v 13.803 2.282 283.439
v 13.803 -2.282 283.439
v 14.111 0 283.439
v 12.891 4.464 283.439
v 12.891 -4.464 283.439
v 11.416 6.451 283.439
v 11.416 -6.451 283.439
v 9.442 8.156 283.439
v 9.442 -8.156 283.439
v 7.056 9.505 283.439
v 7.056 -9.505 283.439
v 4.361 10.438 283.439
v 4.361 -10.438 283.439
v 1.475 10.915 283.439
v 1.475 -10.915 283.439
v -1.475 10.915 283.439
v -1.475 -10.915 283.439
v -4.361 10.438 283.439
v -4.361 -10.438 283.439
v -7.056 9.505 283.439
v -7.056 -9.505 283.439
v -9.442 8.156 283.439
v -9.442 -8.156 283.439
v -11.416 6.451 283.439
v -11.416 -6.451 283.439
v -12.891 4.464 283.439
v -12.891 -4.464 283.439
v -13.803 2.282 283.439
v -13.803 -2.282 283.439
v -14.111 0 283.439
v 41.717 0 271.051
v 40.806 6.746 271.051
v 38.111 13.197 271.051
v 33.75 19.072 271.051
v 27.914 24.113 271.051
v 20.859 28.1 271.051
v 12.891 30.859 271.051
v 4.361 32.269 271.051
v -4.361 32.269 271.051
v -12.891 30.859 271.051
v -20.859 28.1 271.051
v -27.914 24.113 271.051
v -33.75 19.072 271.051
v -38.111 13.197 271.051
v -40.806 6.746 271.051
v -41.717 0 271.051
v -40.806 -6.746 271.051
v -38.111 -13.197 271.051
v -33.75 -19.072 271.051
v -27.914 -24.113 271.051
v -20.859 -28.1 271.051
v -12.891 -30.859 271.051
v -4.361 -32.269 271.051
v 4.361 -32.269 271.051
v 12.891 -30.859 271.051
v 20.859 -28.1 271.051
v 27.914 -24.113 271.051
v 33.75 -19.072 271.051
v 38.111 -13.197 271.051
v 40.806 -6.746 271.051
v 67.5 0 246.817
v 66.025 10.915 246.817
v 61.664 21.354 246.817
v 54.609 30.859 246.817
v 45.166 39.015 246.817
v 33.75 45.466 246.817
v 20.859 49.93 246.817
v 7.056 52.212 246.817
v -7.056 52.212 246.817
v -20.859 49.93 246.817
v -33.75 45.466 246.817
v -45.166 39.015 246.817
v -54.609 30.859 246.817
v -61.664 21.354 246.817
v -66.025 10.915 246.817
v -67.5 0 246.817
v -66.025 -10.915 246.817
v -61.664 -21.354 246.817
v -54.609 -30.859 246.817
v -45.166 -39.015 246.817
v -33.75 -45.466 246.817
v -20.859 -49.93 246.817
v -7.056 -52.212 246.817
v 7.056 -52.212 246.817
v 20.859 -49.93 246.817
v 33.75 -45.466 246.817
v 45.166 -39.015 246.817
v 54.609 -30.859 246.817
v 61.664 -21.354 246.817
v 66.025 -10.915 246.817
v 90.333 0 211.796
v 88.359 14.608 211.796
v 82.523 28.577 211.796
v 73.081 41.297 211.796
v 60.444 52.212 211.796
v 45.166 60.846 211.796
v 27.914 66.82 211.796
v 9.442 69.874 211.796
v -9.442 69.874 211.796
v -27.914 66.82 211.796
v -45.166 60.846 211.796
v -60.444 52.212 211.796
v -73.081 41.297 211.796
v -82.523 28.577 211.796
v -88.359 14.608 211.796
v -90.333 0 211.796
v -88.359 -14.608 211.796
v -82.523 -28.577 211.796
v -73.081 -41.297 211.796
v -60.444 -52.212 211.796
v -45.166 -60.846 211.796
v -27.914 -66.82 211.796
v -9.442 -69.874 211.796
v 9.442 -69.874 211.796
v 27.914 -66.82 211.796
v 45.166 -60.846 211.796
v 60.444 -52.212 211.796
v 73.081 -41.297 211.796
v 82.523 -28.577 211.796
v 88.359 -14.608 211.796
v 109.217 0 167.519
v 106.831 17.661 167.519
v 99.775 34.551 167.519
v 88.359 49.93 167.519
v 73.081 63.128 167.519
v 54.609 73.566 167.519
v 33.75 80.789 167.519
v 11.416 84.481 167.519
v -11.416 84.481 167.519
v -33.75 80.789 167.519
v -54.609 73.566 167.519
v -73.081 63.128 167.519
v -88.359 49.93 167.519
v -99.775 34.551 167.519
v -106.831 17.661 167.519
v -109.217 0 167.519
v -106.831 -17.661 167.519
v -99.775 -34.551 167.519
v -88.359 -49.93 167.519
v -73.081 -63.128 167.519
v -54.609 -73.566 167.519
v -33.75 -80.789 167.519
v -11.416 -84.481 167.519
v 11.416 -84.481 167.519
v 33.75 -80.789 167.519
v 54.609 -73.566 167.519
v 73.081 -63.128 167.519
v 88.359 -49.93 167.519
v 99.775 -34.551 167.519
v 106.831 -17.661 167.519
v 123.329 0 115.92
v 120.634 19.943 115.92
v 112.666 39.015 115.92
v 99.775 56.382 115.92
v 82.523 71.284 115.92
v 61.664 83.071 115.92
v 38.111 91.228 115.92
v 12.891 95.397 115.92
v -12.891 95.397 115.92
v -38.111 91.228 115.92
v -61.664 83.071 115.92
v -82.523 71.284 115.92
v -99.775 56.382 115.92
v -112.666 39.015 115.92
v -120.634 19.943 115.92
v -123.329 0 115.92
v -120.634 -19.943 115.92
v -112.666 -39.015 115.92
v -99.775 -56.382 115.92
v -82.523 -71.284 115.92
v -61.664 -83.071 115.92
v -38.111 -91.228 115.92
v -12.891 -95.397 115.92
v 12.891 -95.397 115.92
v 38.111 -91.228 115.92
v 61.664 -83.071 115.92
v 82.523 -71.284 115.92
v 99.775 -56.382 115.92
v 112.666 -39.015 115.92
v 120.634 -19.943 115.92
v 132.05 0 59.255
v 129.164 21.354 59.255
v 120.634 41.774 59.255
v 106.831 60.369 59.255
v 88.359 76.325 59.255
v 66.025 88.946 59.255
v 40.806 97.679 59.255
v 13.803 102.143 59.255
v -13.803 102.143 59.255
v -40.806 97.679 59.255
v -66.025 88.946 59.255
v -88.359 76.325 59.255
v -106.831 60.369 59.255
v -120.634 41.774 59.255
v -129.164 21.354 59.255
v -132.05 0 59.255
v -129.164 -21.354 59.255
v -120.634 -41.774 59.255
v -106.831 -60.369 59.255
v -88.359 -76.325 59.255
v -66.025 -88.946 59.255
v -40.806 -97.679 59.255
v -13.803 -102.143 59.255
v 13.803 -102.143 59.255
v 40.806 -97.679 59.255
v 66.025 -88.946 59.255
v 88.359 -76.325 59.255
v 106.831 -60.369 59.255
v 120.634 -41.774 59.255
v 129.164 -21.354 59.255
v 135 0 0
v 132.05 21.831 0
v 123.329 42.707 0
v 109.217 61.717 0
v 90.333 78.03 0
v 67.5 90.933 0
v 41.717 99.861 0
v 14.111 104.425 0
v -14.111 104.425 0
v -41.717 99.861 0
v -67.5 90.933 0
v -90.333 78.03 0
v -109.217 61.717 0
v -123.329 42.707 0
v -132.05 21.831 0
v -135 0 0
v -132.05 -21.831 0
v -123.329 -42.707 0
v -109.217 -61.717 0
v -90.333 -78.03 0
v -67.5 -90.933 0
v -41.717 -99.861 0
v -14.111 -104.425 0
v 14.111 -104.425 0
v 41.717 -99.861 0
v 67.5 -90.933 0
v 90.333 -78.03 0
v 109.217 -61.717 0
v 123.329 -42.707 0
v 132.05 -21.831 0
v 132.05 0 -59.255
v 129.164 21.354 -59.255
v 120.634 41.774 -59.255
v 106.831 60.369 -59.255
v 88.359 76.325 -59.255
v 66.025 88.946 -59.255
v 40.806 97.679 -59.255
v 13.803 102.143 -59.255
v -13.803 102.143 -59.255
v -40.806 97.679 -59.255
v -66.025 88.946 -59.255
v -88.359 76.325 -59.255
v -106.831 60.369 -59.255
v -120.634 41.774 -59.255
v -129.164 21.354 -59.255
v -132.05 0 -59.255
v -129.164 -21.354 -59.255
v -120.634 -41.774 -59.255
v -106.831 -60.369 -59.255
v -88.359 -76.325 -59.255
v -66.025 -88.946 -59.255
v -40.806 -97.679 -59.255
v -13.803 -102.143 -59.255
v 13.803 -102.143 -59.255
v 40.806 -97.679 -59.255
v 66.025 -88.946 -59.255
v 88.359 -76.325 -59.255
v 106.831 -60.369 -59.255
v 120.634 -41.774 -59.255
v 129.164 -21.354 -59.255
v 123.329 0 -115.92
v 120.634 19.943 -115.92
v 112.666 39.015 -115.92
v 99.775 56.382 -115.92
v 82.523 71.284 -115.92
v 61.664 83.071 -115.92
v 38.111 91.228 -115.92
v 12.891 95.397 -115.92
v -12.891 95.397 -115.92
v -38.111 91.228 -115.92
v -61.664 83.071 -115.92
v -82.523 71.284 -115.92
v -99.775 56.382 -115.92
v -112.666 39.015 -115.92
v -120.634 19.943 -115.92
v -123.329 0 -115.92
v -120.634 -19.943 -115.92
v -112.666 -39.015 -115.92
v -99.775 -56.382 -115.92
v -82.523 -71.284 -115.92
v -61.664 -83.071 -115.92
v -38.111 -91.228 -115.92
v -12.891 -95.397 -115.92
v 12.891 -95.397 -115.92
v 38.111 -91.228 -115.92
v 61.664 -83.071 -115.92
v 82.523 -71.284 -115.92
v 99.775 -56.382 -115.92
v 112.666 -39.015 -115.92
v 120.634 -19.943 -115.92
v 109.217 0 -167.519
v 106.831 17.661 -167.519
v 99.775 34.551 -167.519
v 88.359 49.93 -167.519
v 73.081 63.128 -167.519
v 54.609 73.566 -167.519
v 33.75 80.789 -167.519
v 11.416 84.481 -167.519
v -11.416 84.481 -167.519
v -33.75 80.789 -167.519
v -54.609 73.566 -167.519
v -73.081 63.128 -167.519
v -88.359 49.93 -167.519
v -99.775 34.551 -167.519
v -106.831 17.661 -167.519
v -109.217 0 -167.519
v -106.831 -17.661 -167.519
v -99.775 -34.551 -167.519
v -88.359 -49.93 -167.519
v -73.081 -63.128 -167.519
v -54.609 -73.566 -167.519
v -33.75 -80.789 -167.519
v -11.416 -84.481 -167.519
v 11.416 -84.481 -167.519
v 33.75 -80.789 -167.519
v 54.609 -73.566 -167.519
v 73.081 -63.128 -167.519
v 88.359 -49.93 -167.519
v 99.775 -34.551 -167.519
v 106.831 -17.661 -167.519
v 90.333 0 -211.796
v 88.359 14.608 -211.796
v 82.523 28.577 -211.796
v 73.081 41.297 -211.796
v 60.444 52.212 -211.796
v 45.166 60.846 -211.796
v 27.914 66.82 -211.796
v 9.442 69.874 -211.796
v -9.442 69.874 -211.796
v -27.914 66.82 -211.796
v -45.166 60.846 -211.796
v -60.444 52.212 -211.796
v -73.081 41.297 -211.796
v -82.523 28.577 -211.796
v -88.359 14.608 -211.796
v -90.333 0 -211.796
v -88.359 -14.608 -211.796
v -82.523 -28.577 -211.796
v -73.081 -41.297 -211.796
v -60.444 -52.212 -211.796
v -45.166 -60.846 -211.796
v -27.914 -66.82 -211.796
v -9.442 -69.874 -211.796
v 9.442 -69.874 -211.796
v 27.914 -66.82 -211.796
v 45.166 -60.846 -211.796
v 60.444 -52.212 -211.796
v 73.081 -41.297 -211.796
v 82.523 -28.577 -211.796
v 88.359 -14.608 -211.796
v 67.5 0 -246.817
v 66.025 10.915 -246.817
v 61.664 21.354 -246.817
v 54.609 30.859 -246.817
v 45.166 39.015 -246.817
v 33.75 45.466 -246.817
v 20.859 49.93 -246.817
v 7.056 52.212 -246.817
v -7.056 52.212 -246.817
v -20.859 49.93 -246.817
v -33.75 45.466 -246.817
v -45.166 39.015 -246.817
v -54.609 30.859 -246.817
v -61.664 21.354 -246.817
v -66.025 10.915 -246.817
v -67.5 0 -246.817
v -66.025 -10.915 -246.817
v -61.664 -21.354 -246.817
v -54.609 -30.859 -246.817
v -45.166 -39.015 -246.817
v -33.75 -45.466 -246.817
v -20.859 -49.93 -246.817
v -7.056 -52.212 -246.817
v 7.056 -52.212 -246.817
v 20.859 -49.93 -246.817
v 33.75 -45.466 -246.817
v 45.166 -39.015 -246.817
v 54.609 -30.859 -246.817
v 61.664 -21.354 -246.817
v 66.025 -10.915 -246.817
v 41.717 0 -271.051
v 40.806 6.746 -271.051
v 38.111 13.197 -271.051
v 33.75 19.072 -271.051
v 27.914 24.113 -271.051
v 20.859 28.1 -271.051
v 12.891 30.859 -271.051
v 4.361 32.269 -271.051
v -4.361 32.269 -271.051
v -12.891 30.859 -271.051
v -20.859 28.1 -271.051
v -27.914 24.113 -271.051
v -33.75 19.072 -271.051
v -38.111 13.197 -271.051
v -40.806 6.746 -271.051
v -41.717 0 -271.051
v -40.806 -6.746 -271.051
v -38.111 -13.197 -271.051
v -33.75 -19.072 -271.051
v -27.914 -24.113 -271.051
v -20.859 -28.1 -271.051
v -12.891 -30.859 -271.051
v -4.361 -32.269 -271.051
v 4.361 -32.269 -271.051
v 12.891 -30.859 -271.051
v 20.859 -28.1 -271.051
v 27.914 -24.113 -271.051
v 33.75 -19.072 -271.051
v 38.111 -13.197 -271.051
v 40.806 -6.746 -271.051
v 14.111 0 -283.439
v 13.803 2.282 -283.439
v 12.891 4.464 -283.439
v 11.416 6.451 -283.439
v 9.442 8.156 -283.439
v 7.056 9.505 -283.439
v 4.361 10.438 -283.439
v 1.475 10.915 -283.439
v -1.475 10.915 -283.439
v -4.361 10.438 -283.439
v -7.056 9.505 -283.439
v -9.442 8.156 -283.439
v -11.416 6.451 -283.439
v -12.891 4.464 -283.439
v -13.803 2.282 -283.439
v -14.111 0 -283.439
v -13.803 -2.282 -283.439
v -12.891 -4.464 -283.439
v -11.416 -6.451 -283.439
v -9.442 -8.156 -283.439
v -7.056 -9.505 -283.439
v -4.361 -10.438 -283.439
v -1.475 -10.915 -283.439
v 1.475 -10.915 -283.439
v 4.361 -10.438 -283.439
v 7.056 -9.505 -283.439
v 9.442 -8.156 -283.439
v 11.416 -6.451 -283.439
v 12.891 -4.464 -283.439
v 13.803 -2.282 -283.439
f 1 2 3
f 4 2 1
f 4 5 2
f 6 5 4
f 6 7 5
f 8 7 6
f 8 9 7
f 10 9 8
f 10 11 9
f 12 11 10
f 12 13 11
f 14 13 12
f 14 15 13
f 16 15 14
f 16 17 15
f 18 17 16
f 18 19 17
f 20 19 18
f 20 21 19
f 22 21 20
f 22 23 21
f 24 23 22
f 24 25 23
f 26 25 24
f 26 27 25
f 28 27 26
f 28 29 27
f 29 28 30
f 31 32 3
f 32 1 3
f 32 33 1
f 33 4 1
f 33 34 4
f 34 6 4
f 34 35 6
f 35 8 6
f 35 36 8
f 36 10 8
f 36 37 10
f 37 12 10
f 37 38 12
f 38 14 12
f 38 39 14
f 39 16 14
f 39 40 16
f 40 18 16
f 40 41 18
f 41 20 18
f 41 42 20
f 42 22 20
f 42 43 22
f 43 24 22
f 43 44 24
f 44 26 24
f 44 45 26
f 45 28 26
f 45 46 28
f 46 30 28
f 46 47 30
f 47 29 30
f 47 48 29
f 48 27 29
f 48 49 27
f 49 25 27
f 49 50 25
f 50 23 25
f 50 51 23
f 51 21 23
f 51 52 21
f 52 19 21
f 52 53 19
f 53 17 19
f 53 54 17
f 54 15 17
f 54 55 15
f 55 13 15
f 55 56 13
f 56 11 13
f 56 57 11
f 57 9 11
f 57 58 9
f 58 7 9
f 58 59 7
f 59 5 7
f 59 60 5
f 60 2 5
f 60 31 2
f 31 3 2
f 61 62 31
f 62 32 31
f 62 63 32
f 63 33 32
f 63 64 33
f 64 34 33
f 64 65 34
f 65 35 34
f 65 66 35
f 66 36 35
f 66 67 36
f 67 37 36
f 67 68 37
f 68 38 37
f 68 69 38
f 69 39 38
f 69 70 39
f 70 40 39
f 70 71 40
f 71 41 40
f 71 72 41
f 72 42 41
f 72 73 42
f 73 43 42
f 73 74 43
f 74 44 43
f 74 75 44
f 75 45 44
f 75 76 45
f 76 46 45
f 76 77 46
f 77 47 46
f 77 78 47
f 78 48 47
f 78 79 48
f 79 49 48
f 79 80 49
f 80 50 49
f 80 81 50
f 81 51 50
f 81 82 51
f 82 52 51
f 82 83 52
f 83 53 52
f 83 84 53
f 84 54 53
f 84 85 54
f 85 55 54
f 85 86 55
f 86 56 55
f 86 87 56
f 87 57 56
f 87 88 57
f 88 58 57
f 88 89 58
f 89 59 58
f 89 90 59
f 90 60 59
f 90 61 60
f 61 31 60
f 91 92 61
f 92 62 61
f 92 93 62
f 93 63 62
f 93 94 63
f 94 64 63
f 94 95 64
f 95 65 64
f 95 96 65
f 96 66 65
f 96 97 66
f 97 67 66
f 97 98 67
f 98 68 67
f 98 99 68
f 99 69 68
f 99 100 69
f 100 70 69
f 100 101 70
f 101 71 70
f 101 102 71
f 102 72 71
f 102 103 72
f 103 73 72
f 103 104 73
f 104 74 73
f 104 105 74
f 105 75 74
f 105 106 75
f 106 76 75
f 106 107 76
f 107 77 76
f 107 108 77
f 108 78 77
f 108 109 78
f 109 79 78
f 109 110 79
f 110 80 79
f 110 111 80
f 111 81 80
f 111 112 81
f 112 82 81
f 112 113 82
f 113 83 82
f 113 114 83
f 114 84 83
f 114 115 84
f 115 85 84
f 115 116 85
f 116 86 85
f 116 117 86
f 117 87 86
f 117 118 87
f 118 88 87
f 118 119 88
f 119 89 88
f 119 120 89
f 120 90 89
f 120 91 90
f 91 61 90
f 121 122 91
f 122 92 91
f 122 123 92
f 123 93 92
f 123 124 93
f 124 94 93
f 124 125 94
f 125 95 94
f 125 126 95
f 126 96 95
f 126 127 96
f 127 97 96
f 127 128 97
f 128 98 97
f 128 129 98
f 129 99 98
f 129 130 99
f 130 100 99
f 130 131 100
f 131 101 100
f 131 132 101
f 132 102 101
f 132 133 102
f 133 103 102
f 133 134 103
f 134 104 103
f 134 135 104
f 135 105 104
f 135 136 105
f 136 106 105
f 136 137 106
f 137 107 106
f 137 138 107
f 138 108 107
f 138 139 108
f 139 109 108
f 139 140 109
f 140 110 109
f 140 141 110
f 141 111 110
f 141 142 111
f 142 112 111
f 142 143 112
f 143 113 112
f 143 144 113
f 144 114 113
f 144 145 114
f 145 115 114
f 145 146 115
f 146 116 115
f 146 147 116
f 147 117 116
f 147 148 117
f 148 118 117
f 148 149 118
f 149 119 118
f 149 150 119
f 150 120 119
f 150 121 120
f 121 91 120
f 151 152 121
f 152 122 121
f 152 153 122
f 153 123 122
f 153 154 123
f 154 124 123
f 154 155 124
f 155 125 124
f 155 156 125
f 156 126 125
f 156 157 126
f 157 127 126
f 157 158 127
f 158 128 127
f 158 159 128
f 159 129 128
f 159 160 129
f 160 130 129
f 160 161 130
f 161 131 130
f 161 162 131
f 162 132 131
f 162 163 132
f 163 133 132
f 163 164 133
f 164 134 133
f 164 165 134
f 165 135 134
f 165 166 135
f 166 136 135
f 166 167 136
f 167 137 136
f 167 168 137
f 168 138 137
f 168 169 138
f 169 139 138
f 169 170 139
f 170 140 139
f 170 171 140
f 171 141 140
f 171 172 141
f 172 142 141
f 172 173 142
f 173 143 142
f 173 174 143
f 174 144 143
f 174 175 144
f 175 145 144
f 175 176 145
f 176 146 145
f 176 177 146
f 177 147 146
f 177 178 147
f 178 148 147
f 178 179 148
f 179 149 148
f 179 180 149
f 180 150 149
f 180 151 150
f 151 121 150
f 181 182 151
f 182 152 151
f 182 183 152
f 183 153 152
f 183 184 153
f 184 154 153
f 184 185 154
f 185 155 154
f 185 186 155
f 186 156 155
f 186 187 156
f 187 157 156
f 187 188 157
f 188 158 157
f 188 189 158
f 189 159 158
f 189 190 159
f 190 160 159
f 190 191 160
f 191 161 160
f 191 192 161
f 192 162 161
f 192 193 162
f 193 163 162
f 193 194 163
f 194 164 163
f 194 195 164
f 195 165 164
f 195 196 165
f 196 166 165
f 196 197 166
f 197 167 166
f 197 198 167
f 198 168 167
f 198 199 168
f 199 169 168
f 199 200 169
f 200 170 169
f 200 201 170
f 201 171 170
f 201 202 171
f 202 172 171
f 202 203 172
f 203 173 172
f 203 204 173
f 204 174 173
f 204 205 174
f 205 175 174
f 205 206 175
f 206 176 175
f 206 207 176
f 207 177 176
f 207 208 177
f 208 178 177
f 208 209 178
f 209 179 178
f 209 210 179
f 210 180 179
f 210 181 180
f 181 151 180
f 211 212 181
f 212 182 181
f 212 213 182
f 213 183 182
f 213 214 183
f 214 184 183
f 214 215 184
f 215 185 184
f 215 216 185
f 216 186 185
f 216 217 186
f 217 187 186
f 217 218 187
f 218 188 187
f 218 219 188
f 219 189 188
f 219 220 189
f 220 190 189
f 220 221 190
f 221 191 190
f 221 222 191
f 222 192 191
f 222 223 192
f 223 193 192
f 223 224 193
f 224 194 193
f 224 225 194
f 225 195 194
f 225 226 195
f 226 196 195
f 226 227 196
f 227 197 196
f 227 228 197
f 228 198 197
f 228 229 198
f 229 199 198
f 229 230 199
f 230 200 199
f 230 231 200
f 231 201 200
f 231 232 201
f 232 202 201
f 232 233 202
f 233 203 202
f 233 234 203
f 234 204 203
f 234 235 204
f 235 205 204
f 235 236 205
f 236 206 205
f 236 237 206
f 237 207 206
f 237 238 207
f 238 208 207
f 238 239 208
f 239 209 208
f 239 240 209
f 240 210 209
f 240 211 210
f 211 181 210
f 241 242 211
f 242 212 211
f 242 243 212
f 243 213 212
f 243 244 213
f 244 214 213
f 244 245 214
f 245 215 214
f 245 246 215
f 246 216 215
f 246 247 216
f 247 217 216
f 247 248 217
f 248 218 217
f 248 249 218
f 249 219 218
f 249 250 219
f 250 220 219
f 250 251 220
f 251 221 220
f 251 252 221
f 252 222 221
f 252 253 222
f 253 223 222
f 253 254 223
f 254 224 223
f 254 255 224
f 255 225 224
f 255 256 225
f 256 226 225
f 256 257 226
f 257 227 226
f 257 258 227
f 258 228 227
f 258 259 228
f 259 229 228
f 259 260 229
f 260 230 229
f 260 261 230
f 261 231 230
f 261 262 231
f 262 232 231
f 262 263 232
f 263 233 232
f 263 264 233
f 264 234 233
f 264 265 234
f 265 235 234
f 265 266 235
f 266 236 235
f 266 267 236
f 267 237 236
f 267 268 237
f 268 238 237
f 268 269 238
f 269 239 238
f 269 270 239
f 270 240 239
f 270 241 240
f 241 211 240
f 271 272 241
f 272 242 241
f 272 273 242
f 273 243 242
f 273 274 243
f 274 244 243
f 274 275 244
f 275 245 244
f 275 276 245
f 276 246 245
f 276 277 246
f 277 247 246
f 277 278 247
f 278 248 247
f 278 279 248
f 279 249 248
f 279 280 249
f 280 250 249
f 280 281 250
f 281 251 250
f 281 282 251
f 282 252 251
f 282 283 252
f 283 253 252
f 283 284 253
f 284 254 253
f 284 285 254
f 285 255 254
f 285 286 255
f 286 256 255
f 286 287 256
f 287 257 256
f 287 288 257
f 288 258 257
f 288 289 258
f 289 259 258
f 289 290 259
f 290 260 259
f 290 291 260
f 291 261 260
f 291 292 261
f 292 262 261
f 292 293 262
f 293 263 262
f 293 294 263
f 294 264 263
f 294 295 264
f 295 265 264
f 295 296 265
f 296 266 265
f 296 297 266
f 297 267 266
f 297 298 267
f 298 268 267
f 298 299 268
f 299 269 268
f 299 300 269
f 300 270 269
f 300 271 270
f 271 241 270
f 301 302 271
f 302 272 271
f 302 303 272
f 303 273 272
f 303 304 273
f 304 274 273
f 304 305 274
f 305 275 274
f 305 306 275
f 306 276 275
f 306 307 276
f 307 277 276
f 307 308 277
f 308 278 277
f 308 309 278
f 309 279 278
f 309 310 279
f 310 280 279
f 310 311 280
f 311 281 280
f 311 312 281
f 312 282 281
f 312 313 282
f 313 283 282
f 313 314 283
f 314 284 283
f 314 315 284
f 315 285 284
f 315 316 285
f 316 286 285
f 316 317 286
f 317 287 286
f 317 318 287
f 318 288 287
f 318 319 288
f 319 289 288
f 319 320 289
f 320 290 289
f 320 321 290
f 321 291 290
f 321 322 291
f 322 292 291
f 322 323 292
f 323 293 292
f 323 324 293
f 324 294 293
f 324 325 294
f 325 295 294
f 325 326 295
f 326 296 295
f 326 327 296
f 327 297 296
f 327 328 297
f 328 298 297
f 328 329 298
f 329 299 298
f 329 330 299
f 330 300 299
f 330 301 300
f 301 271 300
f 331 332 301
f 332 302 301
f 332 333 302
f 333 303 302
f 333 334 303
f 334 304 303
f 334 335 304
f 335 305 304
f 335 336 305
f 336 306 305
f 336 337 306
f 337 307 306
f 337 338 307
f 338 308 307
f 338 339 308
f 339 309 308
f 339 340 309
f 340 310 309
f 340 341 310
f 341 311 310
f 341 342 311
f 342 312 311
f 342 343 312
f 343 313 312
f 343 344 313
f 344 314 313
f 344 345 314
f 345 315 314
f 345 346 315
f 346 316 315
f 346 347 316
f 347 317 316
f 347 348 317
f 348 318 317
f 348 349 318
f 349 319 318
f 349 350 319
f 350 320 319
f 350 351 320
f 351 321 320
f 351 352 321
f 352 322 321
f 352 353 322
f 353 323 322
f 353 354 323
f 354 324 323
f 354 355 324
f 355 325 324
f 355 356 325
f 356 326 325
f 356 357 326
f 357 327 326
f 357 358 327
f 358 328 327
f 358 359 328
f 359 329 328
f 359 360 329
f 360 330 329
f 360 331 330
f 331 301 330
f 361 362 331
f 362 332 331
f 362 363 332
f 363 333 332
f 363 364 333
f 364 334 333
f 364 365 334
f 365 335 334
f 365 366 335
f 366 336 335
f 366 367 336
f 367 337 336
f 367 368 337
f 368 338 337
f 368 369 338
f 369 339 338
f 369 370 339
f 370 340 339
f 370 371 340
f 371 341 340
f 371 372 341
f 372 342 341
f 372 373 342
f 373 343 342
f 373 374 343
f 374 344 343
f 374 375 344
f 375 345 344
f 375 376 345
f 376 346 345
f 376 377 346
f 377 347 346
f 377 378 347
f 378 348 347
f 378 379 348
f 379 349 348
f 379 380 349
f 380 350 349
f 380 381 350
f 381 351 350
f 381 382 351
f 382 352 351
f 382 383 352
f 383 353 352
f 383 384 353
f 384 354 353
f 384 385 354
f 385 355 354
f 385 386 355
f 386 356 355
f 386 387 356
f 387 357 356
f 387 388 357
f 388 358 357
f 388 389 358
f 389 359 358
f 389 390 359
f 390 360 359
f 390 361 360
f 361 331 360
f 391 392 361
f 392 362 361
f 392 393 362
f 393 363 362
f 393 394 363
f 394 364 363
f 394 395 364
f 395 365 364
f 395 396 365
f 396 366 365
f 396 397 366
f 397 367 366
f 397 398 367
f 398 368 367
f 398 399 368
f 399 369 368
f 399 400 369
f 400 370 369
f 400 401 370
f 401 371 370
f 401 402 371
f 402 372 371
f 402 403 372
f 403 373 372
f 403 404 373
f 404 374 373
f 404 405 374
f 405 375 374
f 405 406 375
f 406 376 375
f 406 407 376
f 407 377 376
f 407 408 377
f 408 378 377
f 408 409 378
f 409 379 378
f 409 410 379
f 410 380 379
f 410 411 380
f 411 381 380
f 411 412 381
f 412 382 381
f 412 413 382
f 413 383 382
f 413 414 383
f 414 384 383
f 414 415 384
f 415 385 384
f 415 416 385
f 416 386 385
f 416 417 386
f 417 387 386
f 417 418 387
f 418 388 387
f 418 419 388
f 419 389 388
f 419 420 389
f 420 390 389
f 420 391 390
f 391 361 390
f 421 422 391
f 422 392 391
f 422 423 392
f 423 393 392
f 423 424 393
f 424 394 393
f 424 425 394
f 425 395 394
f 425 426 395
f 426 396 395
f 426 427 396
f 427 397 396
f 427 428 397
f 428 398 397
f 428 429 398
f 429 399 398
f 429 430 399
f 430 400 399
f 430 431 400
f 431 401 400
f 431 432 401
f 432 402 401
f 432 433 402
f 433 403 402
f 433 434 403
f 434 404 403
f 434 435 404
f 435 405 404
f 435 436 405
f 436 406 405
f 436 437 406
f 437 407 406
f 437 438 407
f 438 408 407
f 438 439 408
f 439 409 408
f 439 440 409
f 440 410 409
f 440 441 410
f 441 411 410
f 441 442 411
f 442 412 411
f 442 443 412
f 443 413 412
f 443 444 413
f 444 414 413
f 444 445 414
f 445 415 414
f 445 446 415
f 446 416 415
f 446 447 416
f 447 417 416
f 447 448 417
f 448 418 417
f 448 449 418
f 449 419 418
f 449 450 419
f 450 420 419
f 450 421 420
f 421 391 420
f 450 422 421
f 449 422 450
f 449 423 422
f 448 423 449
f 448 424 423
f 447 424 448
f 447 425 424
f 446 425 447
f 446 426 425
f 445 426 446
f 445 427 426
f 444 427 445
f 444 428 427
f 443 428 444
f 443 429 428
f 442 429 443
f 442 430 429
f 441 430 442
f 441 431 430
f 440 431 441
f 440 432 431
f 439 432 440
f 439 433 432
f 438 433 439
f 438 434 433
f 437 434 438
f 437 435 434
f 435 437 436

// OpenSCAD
// Generated by SolidPython 1.0.1 on 2020-07-29 00:46:48


scale(v = [9, 7, 19]) {
	sphere(r = 15);
}
/***********************************************
*********      SolidPython code:      **********
************************************************
 
# import packages: SolidPython
from solid import *
from solid.utils import *
from itertools import chain, combinations, permutations


class Resize:

    def __init__(self, scad_file):
        self.scad_file = scad_file
        #self.scad_file = import_scad(scad_file)
        # cone/cylinder param:
        self.r1 = 0
        self.r2 = 0
        self.h = 0
        # rectangular prism param:
        self.w = 0
        self.l = 0
        # ellipse param:
        self.r = 0

    # import OpenScad code (file name corresponds to shape)


    # classify shape + parameters
    def assign(self, param1, param2, param3):
        if self.scad_file == 'cone.scad':
            self.r1 = param1
            self.r2 = param2
            self.h = param3
        elif self.scad_file == 'cylinder.scad':
            self.r1 = param1
            self.r2 = param2
            self.h = param3
        elif self.scad_file == 'rectangularPrism.scad':
            self.h = param1
            self.l = param2
            self.w = param3
        else:
            self.r = param1
            self.h = param2

    # resize parameters
    def iterate(self):
        x = range(3, 20, 2)
        i = 1
        if self.scad_file == 'cone.scad':
            tempList = list(permutations(x, 2))
            for temp in tempList:
                param1 = temp[0]
                param2 = temp[1]
                filepath = 'produced_scad_files/' + 'cone' + str(param1) + '_' + str(param2) + '_' + '.scad'
                scad_render_to_file(cylinder(h=param1, r1=param2, r2=0), filepath)

        elif self.scad_file == 'cylinder.scad':
            tempList = list(permutations(x, 3))
            for temp in tempList:
                param1 = temp[0]
                param2 = temp[1]
                filepath = 'produced_scad_files/' + 'cylinder' + str(param1) + '_' + str(param2) + '_' + '.scad'
                scad_render_to_file(cylinder(h=param1, r1=param2, r2=param2), filepath)

        elif self.scad_file == 'rectangularPrism.scad':
            tempList = list(permutations(x, 3))
            for temp in tempList:
                param1 = temp[0]
                param2 = temp[1]
                param3 = temp[2]
                filepath = 'produced_scad_files/' + 'rectangularPrism' + str(param1) + '_' + str(param2) + '_' + str(
                    param3) + '.scad'
                scad_render_to_file(cube(size=(param1, param2, param3)), filepath)

        elif self.scad_file == 'ellipse.scad':
            tempList = list(permutations(x, 4))
            for temp in tempList:
                param1 = temp[0]
                param2 = temp[1]
                param3 = temp[2]
                param4 = temp[3]
                filepath = 'produced_scad_files/' + 'ellipse' + str(param1) + '_' + str(param2) + '_' + str(param3) + '_' + str(param4) + '.scad'
                scad_render_to_file(scale([param1, param2, param3])(sphere(r=param4)), filepath)

    def render_to_scadfile(self):
        scad_render_to_file(scad, 'example.scad') 
 
************************************************/
